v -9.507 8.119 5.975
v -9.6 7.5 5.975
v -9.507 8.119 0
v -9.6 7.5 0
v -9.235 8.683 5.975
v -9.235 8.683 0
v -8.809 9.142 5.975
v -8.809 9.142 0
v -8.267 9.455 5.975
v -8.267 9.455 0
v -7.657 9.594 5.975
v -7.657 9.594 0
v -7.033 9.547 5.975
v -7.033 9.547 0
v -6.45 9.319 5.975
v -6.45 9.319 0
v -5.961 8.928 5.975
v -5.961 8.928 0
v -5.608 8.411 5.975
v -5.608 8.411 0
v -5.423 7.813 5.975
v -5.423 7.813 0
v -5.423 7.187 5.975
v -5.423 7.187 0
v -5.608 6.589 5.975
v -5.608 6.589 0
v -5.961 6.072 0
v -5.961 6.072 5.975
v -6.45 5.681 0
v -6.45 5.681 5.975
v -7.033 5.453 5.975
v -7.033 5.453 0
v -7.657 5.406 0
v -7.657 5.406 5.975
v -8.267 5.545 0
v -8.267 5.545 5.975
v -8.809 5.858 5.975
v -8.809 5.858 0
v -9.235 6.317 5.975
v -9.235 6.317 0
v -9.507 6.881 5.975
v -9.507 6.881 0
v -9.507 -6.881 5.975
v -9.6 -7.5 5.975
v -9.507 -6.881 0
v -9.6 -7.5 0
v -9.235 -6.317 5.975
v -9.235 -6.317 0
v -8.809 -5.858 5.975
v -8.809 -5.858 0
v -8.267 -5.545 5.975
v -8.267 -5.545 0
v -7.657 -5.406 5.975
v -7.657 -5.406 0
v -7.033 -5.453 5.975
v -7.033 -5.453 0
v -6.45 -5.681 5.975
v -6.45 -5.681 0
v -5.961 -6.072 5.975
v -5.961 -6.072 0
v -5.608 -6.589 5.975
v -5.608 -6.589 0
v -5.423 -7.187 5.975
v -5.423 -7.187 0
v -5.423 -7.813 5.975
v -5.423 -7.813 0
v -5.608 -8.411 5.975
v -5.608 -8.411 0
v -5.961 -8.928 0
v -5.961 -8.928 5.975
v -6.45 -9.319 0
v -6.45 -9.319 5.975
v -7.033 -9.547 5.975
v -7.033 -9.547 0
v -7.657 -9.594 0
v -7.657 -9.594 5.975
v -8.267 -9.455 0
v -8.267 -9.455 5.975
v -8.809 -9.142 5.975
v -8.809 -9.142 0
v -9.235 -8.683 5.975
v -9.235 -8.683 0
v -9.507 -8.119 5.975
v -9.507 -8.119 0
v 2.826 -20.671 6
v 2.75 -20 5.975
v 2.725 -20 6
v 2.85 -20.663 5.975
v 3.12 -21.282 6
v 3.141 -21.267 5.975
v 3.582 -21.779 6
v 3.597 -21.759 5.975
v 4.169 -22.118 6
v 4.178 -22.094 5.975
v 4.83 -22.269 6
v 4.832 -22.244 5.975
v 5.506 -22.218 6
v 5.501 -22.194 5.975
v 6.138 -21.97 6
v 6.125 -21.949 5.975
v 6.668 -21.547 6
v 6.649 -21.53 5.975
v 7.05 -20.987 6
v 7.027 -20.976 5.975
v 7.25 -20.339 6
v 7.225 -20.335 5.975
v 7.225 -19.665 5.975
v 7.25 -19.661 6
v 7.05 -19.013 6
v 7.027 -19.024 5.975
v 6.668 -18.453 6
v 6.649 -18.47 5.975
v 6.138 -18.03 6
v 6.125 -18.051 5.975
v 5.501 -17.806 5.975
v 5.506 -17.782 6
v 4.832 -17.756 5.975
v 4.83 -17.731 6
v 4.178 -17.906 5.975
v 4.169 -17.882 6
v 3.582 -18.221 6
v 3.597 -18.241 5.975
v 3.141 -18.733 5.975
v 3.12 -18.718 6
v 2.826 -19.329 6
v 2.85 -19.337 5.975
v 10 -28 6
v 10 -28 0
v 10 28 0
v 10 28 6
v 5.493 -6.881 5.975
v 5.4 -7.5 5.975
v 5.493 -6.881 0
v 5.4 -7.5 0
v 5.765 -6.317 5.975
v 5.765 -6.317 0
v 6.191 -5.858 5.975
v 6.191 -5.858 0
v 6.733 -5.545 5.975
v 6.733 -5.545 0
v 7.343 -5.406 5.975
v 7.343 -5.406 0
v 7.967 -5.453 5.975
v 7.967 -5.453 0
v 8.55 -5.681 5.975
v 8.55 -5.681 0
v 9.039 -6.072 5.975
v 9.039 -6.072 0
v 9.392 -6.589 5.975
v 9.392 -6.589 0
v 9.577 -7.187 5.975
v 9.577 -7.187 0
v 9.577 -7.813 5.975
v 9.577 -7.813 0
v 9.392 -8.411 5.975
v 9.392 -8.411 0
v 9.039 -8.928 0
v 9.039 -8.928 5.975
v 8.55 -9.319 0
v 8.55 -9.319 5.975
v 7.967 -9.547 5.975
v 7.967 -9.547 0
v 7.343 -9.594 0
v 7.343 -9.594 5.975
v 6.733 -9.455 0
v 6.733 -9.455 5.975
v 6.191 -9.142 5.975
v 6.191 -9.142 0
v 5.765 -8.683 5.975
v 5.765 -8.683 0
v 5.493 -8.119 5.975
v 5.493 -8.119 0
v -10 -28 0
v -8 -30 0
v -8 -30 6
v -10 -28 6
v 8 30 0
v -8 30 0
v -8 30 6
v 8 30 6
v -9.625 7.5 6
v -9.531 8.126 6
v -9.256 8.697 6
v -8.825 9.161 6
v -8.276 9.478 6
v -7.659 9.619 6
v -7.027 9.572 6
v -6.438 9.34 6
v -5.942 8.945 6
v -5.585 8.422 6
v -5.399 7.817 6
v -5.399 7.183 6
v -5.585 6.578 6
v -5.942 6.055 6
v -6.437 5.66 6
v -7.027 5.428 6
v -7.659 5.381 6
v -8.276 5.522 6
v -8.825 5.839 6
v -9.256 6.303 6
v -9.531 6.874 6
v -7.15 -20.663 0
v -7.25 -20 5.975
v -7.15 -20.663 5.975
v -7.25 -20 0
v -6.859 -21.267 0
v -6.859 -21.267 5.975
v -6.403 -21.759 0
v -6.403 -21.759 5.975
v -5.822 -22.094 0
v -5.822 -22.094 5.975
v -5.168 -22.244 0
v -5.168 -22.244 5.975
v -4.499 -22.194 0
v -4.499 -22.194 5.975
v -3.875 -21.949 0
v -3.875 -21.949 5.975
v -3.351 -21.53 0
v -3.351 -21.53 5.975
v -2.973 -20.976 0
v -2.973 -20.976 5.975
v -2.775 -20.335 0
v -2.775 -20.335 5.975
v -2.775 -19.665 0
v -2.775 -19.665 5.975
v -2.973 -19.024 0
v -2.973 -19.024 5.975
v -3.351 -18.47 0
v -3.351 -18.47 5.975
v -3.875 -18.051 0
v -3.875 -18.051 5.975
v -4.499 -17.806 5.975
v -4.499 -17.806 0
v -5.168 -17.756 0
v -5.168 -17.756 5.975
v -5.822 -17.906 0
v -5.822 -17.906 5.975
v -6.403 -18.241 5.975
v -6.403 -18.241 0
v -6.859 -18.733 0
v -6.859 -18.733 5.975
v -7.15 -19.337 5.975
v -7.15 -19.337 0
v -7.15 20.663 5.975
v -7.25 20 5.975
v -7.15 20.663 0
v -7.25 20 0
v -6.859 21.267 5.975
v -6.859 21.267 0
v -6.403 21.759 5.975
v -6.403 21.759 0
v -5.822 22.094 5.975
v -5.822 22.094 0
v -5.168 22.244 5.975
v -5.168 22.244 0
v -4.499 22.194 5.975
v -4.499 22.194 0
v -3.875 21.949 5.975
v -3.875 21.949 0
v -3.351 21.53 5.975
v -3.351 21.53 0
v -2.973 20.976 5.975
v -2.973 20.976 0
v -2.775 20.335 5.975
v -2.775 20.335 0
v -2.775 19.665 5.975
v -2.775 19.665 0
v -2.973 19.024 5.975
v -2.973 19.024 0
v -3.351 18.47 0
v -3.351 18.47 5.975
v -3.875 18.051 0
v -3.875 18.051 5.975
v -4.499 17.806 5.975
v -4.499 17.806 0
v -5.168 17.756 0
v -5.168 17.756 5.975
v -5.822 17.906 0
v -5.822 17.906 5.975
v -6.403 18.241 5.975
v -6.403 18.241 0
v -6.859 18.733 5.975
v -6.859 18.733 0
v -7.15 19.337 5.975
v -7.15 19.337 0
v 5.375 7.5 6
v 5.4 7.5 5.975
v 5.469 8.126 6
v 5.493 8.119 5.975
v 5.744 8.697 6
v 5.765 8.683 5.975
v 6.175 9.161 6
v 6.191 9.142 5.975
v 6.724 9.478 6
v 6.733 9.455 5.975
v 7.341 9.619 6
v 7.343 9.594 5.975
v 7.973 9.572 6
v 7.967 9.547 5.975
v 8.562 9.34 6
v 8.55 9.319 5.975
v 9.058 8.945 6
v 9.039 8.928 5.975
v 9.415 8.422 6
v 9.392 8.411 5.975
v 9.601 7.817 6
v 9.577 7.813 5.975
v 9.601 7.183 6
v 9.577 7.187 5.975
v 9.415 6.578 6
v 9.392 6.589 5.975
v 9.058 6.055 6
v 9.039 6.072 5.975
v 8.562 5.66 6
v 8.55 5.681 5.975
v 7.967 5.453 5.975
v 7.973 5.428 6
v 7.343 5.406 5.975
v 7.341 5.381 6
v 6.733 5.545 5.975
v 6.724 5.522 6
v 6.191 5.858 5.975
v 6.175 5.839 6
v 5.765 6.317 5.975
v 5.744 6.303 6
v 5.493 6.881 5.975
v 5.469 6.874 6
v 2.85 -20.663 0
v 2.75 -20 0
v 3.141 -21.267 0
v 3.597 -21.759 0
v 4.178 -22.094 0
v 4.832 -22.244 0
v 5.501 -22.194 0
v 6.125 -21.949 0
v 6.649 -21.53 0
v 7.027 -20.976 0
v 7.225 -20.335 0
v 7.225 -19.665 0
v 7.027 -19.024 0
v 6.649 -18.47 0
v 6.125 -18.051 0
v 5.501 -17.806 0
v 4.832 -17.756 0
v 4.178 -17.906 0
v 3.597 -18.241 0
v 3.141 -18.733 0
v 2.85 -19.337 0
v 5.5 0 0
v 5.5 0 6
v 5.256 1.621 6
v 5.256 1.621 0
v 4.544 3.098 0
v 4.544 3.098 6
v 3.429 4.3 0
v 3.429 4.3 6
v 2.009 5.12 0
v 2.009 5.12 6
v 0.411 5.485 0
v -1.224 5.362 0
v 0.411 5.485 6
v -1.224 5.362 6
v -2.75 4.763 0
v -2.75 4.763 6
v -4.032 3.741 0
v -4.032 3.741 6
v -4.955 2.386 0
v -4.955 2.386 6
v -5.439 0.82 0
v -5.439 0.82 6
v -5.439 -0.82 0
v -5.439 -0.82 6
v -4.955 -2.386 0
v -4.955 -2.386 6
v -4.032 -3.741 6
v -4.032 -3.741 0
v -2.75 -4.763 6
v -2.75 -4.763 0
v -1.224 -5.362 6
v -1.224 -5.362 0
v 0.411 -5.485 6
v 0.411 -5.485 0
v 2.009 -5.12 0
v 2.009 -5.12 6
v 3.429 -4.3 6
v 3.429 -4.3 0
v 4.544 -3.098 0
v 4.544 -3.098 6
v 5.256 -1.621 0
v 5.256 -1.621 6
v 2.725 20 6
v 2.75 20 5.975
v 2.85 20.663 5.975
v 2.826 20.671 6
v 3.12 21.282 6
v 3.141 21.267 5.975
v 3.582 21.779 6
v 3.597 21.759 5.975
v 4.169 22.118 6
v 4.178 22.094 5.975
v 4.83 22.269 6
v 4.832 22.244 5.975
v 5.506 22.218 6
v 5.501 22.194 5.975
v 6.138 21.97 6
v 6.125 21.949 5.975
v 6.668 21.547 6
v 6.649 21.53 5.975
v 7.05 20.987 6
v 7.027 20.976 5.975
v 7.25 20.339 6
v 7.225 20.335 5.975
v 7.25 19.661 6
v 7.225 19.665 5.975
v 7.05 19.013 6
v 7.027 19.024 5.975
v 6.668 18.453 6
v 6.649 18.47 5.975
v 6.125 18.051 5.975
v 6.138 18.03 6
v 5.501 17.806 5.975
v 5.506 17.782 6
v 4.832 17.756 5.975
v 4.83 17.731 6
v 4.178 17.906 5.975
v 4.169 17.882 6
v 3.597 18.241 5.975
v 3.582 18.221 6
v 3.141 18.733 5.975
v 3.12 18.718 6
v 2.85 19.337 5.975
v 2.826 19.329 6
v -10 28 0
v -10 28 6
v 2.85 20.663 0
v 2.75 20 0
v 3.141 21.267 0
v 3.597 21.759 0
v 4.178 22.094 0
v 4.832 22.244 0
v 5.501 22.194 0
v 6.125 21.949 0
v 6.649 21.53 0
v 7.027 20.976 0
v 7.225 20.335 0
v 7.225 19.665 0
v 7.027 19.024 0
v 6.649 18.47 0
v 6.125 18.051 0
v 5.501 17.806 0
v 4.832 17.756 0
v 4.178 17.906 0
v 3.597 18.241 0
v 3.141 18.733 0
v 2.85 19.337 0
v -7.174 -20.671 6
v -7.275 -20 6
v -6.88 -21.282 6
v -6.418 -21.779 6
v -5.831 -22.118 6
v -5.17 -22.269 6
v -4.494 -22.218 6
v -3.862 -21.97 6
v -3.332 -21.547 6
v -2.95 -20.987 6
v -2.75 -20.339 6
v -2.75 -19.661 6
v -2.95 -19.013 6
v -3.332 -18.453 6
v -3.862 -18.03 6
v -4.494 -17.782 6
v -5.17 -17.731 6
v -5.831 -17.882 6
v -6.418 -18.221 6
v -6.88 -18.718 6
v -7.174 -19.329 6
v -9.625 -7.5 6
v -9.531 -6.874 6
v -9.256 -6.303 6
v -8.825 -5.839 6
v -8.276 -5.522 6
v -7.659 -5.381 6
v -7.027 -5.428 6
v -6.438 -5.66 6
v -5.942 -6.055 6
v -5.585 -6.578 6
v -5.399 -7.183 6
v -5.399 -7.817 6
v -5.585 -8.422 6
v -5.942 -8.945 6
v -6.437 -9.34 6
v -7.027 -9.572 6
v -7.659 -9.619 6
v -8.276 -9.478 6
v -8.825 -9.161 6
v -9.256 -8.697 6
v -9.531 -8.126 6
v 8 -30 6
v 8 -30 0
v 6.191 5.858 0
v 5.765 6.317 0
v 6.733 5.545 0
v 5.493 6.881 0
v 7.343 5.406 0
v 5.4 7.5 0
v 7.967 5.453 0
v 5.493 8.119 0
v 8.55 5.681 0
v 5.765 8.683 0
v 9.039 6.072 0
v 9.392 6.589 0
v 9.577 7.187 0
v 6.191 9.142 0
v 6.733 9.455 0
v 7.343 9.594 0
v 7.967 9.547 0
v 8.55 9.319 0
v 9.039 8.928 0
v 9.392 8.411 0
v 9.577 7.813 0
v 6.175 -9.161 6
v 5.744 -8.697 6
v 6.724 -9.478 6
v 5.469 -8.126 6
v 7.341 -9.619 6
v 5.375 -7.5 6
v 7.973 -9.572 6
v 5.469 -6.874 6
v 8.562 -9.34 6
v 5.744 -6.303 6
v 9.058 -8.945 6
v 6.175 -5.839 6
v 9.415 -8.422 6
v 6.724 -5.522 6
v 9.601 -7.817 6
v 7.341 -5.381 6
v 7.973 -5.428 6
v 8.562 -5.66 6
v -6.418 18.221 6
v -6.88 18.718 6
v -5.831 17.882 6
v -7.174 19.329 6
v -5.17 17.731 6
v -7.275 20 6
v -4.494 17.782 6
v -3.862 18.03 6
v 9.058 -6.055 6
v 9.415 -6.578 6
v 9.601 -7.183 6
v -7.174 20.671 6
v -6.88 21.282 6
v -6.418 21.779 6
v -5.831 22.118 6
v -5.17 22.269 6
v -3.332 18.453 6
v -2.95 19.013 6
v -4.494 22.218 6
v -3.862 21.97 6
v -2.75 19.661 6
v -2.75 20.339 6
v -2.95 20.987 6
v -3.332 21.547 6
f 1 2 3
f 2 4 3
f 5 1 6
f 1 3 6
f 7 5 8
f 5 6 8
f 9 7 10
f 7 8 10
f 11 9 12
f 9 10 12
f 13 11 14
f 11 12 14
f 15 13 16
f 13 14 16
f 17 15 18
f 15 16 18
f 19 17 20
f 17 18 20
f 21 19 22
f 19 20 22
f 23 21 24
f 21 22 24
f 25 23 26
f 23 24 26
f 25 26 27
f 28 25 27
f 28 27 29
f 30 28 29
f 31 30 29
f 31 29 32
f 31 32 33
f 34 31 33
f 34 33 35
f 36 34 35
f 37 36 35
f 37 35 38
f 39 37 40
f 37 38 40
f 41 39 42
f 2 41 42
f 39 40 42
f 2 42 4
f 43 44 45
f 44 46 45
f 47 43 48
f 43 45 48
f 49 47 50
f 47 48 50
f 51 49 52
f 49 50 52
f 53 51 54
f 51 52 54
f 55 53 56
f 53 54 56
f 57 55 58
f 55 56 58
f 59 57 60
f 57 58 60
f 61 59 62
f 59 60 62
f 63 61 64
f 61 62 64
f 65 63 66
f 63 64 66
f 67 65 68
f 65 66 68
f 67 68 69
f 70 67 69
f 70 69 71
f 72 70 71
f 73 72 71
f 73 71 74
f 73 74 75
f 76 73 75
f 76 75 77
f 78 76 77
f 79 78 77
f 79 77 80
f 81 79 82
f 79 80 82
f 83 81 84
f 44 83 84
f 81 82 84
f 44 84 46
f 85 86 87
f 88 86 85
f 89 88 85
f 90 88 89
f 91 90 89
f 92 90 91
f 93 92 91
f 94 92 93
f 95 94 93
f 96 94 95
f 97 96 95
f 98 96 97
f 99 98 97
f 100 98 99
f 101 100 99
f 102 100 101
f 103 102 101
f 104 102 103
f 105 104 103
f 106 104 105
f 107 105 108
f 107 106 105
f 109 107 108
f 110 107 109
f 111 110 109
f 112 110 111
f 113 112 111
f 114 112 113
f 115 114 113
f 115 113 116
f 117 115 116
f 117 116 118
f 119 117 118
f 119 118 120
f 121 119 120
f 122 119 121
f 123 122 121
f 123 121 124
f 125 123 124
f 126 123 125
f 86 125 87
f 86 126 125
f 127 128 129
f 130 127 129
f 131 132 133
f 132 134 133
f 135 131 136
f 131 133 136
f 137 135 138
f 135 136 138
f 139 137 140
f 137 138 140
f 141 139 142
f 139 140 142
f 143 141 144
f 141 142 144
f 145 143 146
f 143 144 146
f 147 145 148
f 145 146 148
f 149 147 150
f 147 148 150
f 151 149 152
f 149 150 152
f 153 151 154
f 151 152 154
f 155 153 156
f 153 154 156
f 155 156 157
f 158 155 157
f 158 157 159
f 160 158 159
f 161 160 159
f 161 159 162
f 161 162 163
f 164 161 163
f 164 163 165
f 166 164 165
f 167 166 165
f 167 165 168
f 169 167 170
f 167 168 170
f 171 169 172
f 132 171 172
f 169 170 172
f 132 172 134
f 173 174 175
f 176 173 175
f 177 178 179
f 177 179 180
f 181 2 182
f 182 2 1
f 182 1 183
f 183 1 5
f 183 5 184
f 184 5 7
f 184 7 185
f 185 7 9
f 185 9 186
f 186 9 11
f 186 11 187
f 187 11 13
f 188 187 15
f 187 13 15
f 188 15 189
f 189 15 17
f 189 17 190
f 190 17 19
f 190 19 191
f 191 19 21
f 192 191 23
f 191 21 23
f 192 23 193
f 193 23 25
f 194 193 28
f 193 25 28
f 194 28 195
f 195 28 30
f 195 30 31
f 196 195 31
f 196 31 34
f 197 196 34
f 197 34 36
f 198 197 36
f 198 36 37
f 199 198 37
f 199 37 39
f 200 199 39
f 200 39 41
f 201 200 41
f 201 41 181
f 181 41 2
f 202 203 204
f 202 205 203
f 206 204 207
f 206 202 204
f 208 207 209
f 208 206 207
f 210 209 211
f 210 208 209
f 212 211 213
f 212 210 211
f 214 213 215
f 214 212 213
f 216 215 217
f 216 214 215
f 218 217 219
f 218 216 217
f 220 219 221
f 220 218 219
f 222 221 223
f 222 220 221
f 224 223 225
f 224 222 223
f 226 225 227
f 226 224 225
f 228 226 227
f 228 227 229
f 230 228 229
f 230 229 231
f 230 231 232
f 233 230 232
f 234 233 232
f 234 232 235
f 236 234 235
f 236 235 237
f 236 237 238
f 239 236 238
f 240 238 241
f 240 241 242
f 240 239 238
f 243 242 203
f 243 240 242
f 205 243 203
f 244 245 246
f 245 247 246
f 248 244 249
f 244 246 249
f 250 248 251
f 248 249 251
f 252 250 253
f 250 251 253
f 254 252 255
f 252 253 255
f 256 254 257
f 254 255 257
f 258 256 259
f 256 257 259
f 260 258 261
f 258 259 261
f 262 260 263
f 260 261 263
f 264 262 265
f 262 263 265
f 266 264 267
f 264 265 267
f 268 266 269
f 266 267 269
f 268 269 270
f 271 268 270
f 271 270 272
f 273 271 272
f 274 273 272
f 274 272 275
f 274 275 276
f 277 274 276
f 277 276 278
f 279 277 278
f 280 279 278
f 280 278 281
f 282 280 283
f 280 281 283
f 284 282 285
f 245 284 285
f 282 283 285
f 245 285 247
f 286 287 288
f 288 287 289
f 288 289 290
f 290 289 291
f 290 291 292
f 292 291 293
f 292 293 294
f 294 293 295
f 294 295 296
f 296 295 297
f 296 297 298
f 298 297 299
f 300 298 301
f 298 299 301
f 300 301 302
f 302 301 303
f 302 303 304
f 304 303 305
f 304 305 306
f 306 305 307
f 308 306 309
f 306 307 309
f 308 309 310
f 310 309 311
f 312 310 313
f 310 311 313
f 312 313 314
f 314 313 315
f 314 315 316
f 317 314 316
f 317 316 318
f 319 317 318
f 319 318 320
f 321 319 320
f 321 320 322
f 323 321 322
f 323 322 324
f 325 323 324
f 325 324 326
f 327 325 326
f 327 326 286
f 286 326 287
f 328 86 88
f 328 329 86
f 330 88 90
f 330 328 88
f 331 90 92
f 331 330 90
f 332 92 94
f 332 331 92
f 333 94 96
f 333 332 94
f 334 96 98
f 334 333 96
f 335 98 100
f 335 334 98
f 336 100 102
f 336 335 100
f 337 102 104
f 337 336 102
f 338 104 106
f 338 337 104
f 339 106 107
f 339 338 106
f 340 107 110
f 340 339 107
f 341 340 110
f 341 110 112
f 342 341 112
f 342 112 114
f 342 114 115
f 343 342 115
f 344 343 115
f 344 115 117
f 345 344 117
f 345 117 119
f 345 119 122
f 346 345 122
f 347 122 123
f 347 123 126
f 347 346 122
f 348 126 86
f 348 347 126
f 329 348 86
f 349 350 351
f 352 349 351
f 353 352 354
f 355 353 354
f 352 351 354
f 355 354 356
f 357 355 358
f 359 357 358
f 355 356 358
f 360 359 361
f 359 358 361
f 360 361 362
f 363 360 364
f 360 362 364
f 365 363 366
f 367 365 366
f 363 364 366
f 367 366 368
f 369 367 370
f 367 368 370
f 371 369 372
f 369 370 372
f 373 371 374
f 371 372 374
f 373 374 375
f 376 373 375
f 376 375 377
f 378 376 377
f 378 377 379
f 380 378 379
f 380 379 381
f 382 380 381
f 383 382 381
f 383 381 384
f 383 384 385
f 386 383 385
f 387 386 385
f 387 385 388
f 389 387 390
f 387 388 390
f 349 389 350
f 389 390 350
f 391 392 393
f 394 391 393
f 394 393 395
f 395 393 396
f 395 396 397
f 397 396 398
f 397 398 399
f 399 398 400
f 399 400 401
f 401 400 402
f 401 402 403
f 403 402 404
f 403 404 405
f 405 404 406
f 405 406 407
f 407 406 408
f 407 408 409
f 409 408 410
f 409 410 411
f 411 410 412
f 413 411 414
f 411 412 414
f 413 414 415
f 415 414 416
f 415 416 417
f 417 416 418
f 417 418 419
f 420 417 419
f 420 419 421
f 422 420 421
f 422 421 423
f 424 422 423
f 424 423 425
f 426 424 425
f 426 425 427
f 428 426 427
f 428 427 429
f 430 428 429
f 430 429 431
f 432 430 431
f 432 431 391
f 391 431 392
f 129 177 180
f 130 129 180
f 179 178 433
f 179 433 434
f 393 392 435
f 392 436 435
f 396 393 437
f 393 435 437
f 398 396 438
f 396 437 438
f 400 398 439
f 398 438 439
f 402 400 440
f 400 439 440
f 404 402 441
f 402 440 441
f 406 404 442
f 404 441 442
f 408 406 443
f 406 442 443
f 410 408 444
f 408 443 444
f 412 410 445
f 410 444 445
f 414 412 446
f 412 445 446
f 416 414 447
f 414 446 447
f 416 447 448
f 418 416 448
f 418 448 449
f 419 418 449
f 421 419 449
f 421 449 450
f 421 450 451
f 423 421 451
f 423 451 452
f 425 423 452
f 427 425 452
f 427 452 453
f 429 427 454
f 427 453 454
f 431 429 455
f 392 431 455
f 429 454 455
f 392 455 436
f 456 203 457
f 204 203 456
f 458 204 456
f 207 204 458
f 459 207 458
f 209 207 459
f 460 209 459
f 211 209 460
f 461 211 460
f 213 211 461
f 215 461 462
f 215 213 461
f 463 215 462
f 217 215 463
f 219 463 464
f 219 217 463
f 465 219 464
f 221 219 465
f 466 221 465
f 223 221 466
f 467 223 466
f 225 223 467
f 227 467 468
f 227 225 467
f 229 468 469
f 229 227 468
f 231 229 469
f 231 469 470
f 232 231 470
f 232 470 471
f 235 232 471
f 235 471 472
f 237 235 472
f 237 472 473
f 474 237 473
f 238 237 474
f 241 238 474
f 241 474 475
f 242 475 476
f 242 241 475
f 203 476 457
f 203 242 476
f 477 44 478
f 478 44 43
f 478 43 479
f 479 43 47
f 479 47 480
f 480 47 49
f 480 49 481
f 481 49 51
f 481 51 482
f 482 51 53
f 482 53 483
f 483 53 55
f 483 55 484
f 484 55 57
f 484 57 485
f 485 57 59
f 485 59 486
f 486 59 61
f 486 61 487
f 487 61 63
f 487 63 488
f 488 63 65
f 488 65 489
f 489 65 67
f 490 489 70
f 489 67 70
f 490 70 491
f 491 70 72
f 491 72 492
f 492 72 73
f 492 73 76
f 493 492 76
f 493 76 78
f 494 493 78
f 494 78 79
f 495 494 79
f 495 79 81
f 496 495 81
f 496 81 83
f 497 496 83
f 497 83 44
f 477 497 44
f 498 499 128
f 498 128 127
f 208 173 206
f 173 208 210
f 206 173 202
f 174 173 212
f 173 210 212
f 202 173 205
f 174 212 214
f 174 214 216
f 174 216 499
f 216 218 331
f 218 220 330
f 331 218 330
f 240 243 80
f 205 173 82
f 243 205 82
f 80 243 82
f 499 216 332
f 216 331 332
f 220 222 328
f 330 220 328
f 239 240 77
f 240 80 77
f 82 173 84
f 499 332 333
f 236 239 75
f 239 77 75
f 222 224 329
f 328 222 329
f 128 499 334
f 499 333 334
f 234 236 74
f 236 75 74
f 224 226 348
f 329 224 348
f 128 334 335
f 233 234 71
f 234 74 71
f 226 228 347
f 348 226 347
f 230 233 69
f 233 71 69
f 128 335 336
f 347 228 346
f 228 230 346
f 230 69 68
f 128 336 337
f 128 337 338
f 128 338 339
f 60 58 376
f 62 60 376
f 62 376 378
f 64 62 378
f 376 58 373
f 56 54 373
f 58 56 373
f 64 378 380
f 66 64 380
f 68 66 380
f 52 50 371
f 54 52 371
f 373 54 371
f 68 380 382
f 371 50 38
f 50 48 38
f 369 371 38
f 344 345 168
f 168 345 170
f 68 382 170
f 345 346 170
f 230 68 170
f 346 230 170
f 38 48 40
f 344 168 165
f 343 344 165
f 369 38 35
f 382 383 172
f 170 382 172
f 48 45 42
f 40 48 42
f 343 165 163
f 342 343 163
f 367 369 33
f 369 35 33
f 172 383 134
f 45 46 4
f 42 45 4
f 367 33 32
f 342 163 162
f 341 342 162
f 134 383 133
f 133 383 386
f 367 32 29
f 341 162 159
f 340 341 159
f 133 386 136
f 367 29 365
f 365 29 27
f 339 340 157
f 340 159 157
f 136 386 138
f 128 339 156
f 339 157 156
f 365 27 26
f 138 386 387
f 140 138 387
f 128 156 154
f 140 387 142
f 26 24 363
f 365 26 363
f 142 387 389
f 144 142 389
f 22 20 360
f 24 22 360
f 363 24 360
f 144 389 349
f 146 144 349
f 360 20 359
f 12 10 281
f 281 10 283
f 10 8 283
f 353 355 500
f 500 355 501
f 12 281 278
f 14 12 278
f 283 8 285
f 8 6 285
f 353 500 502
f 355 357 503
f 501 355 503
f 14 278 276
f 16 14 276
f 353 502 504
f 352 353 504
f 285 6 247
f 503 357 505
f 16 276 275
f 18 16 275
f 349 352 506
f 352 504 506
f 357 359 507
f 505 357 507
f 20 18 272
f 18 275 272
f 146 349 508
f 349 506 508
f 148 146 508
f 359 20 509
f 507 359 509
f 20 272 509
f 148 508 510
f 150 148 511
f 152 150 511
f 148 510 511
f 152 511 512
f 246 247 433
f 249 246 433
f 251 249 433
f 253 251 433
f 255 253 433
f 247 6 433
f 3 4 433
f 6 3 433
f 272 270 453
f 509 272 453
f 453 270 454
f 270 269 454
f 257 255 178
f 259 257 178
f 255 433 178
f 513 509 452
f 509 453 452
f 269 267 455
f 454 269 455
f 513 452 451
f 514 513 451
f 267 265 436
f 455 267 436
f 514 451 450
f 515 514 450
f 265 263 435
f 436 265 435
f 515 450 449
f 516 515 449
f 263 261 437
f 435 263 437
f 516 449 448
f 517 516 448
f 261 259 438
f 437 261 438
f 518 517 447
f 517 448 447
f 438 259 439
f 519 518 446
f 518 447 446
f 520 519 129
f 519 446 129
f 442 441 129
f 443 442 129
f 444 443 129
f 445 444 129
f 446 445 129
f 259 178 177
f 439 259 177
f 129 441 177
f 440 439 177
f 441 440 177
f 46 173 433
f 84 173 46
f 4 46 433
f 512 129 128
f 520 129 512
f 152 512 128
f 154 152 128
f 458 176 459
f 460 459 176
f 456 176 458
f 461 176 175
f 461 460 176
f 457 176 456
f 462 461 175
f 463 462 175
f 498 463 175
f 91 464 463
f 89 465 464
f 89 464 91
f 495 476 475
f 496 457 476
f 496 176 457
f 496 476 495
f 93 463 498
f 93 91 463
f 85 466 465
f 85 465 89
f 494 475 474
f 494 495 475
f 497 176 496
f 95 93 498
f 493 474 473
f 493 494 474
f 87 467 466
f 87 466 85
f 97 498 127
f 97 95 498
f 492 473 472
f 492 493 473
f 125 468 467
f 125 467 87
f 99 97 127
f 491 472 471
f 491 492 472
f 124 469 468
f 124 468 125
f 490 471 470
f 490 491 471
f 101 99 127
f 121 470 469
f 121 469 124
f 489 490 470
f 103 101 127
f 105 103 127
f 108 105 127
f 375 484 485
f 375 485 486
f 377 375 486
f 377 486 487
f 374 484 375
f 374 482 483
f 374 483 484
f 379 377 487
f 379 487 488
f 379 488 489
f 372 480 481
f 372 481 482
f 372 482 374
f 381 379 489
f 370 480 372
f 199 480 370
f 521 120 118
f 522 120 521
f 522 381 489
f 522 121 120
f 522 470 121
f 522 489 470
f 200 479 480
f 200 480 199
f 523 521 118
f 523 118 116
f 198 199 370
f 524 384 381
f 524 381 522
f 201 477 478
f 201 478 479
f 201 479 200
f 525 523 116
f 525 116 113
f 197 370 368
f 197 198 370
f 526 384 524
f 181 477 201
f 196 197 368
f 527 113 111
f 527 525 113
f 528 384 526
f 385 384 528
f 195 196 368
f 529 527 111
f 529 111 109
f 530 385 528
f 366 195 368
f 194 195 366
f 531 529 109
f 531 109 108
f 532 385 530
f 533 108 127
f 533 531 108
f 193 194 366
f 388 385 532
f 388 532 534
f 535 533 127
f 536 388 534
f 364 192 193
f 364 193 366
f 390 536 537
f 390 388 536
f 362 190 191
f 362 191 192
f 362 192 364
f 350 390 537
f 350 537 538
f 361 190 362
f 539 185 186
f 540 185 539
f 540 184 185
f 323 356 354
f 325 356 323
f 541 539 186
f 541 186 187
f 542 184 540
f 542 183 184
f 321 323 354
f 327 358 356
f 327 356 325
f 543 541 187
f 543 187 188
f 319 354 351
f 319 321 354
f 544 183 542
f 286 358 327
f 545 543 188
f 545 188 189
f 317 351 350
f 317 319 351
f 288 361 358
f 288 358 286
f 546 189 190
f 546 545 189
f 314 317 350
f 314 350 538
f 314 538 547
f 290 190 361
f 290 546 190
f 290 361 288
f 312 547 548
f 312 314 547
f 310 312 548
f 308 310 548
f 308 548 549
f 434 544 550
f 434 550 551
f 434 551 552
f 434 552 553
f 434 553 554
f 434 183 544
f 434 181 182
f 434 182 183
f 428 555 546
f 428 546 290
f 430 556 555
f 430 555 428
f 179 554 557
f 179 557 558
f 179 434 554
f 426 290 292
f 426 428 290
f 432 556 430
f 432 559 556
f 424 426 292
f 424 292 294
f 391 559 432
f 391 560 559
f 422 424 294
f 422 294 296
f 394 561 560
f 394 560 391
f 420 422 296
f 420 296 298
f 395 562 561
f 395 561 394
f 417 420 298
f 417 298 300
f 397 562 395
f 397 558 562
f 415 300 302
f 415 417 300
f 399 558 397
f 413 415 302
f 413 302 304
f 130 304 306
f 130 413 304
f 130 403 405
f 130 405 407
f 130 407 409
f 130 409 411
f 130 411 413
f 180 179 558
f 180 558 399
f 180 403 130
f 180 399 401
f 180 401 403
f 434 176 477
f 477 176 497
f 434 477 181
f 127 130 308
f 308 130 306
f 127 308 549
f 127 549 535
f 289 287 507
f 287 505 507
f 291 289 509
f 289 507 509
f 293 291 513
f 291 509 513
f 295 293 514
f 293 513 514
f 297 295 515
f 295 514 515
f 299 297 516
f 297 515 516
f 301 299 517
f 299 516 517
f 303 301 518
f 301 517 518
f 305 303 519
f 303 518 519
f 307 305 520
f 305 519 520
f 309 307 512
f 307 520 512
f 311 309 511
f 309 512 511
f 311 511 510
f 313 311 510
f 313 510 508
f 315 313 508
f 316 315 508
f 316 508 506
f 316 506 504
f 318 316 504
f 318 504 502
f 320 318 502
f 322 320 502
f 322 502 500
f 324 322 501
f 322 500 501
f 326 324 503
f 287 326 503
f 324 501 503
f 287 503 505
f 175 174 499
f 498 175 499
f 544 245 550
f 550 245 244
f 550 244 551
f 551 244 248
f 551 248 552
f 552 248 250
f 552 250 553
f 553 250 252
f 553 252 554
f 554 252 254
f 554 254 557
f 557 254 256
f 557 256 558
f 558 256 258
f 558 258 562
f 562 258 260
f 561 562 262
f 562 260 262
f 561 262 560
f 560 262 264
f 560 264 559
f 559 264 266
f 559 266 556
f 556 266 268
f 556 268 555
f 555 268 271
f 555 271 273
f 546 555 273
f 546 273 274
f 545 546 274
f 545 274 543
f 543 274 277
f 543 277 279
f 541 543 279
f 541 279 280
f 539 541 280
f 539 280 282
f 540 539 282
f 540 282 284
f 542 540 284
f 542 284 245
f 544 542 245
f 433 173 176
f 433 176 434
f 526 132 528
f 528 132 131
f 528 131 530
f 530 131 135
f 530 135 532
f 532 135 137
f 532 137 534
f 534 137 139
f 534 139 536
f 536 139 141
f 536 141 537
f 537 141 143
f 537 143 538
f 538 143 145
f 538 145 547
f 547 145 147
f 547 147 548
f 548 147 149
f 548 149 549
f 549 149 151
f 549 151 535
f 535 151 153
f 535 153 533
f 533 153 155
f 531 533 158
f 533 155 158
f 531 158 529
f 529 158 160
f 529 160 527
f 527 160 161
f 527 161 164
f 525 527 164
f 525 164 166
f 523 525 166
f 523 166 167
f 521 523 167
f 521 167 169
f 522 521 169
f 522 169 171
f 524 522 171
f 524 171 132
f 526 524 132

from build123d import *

# Parameters (mm, degrees)
SKETCH_1_W                        = 20
SKETCH_1_H                        = 60
EXTRUDE_1_DEPTH                   = 6
HOLE_WIZARD_4_5_4_5_1_D           = 4.5
HOLE_WIZARD_4_5_4_5_1_CSINK_D     = 4.55
HOLE_WIZARD_4_5_4_5_1_CSINK_ANGLE = 90
SKETCH_4_R                        = 5.5
CUT_EXTRUDE_1_DEPTH               = 6
HOLE_WIZARD_4_2_4_2_1_D           = 4.2
HOLE_WIZARD_4_2_4_2_1_CSINK_D     = 4.25
HOLE_WIZARD_4_2_4_2_1_CSINK_ANGLE = 90
CHAMFER_1_SIZE                    = 2


with BuildPart() as part:
    # 草图1 → 凸台-拉伸1 (new body)
    with BuildSketch(Plane.XY):
        Rectangle(SKETCH_1_W, SKETCH_1_H)
    extrude(amount=EXTRUDE_1_DEPTH)

    # Ø4.5 (4.5) 直径孔1 (through all)
    with Locations(Plane(origin=(-5, 20, 6), x_dir=(1, 0, 0), z_dir=(0, 0, 1))):
        with Locations((0, 0), (10, 0)):
            hole_wizard_4_5_4_5_1 = CounterSinkHole(HOLE_WIZARD_4_5_4_5_1_D / 2, HOLE_WIZARD_4_5_4_5_1_CSINK_D / 2, counter_sink_angle=HOLE_WIZARD_4_5_4_5_1_CSINK_ANGLE)

    # 镜向1: Ø4.5 (4.5) 直径孔1 across plane
    add(hole_wizard_4_5_4_5_1.mirror(Plane.ZX), mode=Mode.SUBTRACT)

    # 草图4 → 切除-拉伸1 (cut)
    with BuildSketch(Plane.XY.offset(6)):
        Circle(SKETCH_4_R)
    extrude(amount=-CUT_EXTRUDE_1_DEPTH, mode=Mode.SUBTRACT)

    # Ø4.2 (4.2) 直径孔1 (through all)
    with Locations(Plane(origin=(-7.5, 7.5, 6), x_dir=(1, 0, 0), z_dir=(0, 0, 1))):
        with Locations((0, 0), (15, 0), (15, -15), (0, -15)):
            CounterSinkHole(HOLE_WIZARD_4_2_4_2_1_D / 2, HOLE_WIZARD_4_2_4_2_1_CSINK_D / 2, counter_sink_angle=HOLE_WIZARD_4_2_4_2_1_CSINK_ANGLE)

    # 倒角1
    chamfer_1_edges = [part.edges().sort_by_distance(p)[0] for p in [
        (10, -30, 3),
        (-10, -30, 3),
        (-10, 30, 3),
        (10, 30, 3),
    ]]
    chamfer(chamfer_1_edges, length=CHAMFER_1_SIZE)


solid = part.part
